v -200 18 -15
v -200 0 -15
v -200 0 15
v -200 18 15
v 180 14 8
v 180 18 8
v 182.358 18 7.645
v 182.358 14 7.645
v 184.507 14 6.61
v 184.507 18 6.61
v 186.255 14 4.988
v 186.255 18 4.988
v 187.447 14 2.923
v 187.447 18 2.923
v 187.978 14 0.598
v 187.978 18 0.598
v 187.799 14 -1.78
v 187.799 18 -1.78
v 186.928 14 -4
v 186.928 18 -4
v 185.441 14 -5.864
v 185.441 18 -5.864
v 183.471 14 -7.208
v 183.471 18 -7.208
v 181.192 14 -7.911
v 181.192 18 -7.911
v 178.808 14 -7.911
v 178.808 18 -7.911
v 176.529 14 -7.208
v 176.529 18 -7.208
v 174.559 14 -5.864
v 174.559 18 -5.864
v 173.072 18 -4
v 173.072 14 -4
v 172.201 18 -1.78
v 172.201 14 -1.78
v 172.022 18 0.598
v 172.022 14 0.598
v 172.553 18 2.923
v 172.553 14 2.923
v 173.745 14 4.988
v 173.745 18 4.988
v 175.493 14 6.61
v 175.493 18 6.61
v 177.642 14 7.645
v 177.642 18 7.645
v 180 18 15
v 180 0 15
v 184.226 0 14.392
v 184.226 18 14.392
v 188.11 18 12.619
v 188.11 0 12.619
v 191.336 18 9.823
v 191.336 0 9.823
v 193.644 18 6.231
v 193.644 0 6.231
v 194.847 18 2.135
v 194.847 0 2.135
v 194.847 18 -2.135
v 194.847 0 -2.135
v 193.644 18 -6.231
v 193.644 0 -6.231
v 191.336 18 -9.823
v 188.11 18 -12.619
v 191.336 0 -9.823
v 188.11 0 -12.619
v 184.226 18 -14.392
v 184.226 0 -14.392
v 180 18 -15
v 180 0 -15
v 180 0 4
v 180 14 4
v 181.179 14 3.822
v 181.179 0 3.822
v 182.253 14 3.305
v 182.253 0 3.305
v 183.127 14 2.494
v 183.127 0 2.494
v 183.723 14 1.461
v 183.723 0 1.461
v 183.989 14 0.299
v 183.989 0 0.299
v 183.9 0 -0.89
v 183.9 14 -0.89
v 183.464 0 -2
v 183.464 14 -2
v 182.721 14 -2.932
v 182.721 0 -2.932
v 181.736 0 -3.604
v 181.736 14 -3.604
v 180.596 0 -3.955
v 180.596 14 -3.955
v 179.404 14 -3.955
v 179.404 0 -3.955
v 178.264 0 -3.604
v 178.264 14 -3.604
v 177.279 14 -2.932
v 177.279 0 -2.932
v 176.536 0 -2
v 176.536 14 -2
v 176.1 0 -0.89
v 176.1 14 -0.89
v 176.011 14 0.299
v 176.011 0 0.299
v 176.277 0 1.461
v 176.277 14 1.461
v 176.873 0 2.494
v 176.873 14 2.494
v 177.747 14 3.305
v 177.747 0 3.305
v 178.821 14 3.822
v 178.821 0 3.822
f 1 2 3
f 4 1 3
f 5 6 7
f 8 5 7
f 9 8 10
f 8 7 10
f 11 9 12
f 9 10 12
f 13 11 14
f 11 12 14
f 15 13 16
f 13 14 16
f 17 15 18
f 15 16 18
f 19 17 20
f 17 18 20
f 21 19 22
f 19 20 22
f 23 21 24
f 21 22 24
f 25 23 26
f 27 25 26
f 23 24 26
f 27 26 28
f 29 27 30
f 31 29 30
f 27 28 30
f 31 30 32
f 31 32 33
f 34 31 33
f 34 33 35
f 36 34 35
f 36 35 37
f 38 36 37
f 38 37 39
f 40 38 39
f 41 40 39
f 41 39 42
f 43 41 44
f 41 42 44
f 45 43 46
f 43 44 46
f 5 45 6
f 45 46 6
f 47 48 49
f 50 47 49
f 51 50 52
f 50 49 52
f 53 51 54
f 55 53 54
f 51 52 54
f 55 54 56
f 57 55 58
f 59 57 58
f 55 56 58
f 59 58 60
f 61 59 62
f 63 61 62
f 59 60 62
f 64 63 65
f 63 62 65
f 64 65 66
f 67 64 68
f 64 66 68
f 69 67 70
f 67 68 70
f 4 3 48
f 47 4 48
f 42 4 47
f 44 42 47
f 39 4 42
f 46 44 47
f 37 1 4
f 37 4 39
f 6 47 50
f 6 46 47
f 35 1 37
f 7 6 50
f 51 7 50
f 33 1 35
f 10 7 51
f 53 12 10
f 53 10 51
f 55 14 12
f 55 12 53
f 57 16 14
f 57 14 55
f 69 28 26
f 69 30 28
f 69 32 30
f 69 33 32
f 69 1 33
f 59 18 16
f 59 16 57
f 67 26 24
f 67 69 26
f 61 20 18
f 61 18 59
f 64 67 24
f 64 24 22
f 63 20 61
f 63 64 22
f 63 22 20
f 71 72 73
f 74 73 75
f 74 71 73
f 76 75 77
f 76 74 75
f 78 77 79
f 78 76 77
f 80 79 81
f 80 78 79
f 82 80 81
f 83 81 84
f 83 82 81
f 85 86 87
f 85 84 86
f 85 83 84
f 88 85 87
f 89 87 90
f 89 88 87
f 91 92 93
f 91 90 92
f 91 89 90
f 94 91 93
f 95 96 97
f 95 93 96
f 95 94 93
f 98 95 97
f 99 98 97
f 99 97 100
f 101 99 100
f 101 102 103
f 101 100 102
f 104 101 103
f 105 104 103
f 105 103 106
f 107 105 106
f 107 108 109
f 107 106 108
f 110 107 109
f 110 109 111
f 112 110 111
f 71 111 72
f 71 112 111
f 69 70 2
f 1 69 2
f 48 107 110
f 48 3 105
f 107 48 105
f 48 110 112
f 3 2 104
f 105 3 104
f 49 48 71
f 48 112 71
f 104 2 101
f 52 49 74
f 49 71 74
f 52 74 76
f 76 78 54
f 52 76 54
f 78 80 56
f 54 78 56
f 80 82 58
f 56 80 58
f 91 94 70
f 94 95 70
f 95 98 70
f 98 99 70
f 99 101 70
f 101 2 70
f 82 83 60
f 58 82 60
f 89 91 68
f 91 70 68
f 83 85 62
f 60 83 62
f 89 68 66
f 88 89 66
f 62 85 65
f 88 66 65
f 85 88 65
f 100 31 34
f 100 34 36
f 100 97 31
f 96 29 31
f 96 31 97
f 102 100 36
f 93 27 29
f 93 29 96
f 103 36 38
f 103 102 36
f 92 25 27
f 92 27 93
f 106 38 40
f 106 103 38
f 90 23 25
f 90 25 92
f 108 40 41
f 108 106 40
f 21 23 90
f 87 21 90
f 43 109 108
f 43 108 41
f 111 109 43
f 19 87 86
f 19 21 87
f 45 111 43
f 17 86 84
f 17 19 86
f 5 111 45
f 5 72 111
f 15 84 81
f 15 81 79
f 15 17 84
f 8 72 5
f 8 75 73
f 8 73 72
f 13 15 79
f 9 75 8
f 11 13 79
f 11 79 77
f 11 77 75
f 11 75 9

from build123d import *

# Parameters (mm, degrees)
SKETCH1_R           = 4
BOSS_EXTRUDE1_DEPTH = 18
SKETCH2_R           = 8
CUT_EXTRUDE1_DEPTH  = 4


with BuildPart() as part:
    # Sketch1 → Boss-Extrude1 (new body)
    with BuildSketch(Plane(origin=(0, 0, 0), x_dir=(1, 0, 0), z_dir=(0, 1, 0))):
        with BuildLine():
            Line((-200, 15), (-200, -15))
            Line((-200, -15), (180, -15))
            ThreePointArc((180, -15), (195, 0), (180, 15))
            Line((180, 15), (-200, 15))
        make_face()
        with Locations(Location((180, 0, 0), (0, 0, 270))):
            Circle(SKETCH1_R, mode=Mode.SUBTRACT)
    extrude(amount=BOSS_EXTRUDE1_DEPTH)

    # Sketch2 → Cut-Extrude1 (cut)
    with BuildSketch(Plane(origin=(0, 18, 0), x_dir=(1, 0, 0), z_dir=(0, 1, 0))):
        with Locations(Location((180, 0, 0), (0, 0, 270))):
            Circle(SKETCH2_R)
    extrude(amount=-CUT_EXTRUDE1_DEPTH, mode=Mode.SUBTRACT)


solid = part.part
